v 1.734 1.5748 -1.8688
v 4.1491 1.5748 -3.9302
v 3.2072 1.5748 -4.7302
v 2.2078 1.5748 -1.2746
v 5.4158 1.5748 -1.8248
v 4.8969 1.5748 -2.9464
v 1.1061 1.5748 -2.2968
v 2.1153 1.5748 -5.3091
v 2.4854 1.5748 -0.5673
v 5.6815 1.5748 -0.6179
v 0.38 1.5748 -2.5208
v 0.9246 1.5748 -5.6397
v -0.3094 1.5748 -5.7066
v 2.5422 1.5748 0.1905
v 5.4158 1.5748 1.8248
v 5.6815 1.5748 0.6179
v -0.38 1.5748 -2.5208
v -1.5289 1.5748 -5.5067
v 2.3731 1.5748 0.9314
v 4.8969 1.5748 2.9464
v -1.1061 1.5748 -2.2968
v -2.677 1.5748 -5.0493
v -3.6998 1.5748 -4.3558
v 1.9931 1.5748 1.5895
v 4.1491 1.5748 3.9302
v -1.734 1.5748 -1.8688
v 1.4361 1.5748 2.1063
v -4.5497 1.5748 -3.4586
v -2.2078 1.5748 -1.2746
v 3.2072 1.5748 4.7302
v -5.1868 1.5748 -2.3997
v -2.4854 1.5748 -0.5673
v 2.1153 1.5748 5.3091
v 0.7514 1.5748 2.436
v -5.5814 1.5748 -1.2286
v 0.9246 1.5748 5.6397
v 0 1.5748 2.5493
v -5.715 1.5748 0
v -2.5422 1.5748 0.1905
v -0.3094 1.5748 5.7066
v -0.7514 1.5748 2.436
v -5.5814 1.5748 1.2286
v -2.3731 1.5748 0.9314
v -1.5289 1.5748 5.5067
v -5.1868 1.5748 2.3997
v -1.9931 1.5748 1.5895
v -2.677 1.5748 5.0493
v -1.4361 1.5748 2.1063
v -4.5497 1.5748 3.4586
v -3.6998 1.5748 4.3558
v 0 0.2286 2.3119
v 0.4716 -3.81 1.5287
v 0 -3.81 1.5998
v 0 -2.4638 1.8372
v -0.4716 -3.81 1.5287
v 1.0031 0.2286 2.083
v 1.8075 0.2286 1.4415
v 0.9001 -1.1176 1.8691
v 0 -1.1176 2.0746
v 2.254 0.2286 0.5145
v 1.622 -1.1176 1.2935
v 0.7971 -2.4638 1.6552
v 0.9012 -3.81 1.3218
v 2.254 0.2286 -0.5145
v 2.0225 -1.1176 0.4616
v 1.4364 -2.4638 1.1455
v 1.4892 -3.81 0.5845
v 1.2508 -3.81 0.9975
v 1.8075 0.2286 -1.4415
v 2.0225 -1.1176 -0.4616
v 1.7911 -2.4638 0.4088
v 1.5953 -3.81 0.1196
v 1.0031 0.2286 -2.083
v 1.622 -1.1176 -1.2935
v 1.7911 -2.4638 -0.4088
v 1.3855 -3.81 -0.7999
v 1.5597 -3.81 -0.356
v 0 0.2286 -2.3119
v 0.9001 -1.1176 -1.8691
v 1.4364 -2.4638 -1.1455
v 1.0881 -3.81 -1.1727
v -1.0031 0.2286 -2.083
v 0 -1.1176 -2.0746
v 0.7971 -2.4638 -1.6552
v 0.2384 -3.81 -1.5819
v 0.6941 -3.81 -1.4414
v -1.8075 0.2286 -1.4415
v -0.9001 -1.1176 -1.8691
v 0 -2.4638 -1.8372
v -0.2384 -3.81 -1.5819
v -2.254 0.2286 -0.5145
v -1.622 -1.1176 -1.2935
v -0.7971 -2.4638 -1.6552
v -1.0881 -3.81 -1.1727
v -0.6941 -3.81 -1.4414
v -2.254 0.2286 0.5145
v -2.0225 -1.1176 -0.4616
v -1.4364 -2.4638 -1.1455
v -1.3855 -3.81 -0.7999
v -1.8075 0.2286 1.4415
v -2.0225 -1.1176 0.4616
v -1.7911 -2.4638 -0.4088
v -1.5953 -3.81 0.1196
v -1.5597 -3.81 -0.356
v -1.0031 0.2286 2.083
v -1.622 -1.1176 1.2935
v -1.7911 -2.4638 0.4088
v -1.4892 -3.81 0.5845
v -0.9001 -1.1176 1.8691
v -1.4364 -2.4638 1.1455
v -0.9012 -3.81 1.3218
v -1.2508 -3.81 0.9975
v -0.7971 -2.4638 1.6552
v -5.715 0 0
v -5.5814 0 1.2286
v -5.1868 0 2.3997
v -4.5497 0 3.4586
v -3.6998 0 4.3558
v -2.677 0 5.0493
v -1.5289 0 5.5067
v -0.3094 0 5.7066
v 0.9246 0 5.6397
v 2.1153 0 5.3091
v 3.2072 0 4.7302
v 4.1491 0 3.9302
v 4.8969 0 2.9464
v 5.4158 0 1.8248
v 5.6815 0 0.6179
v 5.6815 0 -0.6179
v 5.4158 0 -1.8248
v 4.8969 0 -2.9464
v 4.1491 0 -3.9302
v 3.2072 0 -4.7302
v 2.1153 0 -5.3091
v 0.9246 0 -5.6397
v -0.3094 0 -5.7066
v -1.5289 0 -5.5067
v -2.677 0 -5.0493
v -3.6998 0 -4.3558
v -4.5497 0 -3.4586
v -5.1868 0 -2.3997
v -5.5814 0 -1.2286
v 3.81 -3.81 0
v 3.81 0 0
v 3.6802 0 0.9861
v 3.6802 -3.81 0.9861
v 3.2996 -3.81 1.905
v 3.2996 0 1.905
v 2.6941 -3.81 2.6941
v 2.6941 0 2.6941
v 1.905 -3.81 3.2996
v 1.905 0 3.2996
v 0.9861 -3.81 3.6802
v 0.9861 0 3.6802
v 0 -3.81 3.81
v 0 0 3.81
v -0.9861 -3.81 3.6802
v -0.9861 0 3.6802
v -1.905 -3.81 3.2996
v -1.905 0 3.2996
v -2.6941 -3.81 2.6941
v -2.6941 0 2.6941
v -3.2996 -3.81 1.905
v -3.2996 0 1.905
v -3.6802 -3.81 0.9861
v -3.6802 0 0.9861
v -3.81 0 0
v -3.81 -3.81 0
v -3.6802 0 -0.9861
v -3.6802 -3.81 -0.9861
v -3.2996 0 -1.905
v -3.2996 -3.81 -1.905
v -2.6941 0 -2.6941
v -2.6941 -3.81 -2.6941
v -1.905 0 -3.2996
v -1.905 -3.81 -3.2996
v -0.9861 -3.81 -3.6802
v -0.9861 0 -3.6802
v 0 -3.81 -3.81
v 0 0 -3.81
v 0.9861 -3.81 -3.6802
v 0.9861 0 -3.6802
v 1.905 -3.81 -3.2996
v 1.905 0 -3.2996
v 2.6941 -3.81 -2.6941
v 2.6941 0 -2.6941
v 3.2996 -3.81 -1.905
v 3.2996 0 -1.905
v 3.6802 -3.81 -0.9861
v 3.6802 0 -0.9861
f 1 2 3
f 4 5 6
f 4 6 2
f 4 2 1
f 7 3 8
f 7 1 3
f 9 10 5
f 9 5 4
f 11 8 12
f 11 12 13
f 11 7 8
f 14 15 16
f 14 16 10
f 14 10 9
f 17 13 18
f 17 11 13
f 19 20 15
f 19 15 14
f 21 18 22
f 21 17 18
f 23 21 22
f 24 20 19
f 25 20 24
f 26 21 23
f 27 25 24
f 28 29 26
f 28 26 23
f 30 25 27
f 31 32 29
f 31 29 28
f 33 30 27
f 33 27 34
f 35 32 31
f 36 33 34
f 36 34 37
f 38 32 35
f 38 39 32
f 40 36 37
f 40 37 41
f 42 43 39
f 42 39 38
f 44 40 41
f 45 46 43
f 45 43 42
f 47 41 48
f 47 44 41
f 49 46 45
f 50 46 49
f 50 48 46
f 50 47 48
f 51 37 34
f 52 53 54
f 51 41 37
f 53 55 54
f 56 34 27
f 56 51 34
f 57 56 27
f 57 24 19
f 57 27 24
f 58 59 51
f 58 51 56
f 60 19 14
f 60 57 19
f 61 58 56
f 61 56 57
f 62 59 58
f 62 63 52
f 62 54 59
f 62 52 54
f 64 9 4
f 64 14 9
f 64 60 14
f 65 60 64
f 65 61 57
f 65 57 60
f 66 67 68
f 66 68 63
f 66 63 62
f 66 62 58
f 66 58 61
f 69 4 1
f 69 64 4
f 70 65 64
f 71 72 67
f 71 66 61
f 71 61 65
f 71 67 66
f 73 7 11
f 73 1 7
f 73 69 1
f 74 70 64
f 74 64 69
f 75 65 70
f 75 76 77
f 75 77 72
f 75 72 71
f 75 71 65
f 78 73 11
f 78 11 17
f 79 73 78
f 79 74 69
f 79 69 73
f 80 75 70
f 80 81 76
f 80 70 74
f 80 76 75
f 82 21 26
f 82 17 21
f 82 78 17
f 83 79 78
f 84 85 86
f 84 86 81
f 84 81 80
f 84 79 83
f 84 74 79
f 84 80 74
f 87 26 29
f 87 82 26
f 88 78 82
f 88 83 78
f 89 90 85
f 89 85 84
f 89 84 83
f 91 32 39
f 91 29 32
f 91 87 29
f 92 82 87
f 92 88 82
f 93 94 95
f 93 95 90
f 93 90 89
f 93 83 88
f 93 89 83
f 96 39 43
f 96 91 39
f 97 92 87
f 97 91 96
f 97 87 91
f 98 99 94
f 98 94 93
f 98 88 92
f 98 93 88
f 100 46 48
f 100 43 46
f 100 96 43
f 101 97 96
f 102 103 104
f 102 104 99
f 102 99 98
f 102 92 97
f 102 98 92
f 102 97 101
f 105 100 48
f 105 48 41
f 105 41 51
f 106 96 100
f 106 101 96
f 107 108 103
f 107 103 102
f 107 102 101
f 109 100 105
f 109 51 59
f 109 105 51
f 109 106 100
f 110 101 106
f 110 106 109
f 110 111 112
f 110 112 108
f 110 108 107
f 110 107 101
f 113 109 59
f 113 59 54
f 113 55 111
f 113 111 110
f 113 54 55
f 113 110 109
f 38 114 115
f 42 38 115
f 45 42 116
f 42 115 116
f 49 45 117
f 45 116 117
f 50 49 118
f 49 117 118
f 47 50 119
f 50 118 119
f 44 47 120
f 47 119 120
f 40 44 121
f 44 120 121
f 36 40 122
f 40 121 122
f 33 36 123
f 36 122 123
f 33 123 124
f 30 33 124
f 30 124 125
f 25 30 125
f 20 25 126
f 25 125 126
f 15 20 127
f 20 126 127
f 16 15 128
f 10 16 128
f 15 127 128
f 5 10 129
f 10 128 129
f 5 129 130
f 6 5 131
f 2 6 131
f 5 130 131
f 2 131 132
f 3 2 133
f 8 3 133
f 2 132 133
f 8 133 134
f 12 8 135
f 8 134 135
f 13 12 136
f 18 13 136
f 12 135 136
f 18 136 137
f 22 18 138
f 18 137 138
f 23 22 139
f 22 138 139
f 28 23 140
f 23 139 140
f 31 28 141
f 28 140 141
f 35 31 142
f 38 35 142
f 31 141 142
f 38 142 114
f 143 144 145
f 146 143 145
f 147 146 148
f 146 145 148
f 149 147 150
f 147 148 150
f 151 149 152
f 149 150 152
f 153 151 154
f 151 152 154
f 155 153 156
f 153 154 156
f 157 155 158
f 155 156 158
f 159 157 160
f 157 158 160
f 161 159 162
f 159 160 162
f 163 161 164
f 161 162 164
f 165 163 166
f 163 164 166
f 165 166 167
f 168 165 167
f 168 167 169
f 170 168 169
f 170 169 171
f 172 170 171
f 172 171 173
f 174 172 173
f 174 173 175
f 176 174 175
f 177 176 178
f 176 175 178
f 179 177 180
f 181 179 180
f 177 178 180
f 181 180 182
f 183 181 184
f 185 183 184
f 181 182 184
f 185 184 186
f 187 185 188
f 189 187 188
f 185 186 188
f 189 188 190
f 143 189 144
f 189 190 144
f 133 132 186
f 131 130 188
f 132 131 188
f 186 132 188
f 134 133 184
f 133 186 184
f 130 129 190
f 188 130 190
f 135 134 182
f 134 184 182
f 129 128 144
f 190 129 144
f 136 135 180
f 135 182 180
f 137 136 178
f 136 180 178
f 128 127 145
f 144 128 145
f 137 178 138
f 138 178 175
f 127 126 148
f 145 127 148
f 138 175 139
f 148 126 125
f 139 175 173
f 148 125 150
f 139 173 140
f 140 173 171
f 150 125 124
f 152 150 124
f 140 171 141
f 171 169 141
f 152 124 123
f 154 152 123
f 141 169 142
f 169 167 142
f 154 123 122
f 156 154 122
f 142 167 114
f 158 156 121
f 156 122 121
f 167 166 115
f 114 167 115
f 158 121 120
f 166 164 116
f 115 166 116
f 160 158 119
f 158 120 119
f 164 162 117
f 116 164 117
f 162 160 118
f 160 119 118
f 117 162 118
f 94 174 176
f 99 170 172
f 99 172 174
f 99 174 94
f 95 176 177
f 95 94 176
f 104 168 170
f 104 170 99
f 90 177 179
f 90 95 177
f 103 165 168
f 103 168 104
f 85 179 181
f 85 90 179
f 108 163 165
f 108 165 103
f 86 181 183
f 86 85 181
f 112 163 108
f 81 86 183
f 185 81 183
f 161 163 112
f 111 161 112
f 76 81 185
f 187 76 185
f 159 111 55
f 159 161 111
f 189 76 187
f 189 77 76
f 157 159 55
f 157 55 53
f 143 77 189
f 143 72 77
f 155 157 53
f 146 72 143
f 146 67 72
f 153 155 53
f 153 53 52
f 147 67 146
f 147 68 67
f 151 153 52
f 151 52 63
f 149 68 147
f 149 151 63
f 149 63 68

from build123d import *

# Parameters (mm, degrees)
F0_R     = 3.81
F1_DEPTH = 3.81
F2_R     = 5.715
F3_DEPTH = 1.5748


with BuildPart() as f1:
    # F0 (on Front) → F1 (new body)
    with BuildSketch(Plane.XZ):
        Circle(F0_R)
    extrude(amount=F1_DEPTH)

    # F2 (on face) → F3 (join)
    with BuildSketch(Plane(origin=(0, 0, 0), x_dir=(-1, 0, 0), z_dir=(0, 1, 0))):
        Circle(F2_R)
    extrude(amount=F3_DEPTH)

    # F4 (on Right) → F5 (revolve, cut)
    with BuildSketch(Plane.YZ):
        Polygon((-3.879813, 1.5875), (-3.879813, 0), (1.65217, 0), (1.65217, 2.562938), align=None)
    revolve(axis=Axis((0, -1.113821, 0), (0, 1, 0)), mode=Mode.SUBTRACT)


solid = f1.part
